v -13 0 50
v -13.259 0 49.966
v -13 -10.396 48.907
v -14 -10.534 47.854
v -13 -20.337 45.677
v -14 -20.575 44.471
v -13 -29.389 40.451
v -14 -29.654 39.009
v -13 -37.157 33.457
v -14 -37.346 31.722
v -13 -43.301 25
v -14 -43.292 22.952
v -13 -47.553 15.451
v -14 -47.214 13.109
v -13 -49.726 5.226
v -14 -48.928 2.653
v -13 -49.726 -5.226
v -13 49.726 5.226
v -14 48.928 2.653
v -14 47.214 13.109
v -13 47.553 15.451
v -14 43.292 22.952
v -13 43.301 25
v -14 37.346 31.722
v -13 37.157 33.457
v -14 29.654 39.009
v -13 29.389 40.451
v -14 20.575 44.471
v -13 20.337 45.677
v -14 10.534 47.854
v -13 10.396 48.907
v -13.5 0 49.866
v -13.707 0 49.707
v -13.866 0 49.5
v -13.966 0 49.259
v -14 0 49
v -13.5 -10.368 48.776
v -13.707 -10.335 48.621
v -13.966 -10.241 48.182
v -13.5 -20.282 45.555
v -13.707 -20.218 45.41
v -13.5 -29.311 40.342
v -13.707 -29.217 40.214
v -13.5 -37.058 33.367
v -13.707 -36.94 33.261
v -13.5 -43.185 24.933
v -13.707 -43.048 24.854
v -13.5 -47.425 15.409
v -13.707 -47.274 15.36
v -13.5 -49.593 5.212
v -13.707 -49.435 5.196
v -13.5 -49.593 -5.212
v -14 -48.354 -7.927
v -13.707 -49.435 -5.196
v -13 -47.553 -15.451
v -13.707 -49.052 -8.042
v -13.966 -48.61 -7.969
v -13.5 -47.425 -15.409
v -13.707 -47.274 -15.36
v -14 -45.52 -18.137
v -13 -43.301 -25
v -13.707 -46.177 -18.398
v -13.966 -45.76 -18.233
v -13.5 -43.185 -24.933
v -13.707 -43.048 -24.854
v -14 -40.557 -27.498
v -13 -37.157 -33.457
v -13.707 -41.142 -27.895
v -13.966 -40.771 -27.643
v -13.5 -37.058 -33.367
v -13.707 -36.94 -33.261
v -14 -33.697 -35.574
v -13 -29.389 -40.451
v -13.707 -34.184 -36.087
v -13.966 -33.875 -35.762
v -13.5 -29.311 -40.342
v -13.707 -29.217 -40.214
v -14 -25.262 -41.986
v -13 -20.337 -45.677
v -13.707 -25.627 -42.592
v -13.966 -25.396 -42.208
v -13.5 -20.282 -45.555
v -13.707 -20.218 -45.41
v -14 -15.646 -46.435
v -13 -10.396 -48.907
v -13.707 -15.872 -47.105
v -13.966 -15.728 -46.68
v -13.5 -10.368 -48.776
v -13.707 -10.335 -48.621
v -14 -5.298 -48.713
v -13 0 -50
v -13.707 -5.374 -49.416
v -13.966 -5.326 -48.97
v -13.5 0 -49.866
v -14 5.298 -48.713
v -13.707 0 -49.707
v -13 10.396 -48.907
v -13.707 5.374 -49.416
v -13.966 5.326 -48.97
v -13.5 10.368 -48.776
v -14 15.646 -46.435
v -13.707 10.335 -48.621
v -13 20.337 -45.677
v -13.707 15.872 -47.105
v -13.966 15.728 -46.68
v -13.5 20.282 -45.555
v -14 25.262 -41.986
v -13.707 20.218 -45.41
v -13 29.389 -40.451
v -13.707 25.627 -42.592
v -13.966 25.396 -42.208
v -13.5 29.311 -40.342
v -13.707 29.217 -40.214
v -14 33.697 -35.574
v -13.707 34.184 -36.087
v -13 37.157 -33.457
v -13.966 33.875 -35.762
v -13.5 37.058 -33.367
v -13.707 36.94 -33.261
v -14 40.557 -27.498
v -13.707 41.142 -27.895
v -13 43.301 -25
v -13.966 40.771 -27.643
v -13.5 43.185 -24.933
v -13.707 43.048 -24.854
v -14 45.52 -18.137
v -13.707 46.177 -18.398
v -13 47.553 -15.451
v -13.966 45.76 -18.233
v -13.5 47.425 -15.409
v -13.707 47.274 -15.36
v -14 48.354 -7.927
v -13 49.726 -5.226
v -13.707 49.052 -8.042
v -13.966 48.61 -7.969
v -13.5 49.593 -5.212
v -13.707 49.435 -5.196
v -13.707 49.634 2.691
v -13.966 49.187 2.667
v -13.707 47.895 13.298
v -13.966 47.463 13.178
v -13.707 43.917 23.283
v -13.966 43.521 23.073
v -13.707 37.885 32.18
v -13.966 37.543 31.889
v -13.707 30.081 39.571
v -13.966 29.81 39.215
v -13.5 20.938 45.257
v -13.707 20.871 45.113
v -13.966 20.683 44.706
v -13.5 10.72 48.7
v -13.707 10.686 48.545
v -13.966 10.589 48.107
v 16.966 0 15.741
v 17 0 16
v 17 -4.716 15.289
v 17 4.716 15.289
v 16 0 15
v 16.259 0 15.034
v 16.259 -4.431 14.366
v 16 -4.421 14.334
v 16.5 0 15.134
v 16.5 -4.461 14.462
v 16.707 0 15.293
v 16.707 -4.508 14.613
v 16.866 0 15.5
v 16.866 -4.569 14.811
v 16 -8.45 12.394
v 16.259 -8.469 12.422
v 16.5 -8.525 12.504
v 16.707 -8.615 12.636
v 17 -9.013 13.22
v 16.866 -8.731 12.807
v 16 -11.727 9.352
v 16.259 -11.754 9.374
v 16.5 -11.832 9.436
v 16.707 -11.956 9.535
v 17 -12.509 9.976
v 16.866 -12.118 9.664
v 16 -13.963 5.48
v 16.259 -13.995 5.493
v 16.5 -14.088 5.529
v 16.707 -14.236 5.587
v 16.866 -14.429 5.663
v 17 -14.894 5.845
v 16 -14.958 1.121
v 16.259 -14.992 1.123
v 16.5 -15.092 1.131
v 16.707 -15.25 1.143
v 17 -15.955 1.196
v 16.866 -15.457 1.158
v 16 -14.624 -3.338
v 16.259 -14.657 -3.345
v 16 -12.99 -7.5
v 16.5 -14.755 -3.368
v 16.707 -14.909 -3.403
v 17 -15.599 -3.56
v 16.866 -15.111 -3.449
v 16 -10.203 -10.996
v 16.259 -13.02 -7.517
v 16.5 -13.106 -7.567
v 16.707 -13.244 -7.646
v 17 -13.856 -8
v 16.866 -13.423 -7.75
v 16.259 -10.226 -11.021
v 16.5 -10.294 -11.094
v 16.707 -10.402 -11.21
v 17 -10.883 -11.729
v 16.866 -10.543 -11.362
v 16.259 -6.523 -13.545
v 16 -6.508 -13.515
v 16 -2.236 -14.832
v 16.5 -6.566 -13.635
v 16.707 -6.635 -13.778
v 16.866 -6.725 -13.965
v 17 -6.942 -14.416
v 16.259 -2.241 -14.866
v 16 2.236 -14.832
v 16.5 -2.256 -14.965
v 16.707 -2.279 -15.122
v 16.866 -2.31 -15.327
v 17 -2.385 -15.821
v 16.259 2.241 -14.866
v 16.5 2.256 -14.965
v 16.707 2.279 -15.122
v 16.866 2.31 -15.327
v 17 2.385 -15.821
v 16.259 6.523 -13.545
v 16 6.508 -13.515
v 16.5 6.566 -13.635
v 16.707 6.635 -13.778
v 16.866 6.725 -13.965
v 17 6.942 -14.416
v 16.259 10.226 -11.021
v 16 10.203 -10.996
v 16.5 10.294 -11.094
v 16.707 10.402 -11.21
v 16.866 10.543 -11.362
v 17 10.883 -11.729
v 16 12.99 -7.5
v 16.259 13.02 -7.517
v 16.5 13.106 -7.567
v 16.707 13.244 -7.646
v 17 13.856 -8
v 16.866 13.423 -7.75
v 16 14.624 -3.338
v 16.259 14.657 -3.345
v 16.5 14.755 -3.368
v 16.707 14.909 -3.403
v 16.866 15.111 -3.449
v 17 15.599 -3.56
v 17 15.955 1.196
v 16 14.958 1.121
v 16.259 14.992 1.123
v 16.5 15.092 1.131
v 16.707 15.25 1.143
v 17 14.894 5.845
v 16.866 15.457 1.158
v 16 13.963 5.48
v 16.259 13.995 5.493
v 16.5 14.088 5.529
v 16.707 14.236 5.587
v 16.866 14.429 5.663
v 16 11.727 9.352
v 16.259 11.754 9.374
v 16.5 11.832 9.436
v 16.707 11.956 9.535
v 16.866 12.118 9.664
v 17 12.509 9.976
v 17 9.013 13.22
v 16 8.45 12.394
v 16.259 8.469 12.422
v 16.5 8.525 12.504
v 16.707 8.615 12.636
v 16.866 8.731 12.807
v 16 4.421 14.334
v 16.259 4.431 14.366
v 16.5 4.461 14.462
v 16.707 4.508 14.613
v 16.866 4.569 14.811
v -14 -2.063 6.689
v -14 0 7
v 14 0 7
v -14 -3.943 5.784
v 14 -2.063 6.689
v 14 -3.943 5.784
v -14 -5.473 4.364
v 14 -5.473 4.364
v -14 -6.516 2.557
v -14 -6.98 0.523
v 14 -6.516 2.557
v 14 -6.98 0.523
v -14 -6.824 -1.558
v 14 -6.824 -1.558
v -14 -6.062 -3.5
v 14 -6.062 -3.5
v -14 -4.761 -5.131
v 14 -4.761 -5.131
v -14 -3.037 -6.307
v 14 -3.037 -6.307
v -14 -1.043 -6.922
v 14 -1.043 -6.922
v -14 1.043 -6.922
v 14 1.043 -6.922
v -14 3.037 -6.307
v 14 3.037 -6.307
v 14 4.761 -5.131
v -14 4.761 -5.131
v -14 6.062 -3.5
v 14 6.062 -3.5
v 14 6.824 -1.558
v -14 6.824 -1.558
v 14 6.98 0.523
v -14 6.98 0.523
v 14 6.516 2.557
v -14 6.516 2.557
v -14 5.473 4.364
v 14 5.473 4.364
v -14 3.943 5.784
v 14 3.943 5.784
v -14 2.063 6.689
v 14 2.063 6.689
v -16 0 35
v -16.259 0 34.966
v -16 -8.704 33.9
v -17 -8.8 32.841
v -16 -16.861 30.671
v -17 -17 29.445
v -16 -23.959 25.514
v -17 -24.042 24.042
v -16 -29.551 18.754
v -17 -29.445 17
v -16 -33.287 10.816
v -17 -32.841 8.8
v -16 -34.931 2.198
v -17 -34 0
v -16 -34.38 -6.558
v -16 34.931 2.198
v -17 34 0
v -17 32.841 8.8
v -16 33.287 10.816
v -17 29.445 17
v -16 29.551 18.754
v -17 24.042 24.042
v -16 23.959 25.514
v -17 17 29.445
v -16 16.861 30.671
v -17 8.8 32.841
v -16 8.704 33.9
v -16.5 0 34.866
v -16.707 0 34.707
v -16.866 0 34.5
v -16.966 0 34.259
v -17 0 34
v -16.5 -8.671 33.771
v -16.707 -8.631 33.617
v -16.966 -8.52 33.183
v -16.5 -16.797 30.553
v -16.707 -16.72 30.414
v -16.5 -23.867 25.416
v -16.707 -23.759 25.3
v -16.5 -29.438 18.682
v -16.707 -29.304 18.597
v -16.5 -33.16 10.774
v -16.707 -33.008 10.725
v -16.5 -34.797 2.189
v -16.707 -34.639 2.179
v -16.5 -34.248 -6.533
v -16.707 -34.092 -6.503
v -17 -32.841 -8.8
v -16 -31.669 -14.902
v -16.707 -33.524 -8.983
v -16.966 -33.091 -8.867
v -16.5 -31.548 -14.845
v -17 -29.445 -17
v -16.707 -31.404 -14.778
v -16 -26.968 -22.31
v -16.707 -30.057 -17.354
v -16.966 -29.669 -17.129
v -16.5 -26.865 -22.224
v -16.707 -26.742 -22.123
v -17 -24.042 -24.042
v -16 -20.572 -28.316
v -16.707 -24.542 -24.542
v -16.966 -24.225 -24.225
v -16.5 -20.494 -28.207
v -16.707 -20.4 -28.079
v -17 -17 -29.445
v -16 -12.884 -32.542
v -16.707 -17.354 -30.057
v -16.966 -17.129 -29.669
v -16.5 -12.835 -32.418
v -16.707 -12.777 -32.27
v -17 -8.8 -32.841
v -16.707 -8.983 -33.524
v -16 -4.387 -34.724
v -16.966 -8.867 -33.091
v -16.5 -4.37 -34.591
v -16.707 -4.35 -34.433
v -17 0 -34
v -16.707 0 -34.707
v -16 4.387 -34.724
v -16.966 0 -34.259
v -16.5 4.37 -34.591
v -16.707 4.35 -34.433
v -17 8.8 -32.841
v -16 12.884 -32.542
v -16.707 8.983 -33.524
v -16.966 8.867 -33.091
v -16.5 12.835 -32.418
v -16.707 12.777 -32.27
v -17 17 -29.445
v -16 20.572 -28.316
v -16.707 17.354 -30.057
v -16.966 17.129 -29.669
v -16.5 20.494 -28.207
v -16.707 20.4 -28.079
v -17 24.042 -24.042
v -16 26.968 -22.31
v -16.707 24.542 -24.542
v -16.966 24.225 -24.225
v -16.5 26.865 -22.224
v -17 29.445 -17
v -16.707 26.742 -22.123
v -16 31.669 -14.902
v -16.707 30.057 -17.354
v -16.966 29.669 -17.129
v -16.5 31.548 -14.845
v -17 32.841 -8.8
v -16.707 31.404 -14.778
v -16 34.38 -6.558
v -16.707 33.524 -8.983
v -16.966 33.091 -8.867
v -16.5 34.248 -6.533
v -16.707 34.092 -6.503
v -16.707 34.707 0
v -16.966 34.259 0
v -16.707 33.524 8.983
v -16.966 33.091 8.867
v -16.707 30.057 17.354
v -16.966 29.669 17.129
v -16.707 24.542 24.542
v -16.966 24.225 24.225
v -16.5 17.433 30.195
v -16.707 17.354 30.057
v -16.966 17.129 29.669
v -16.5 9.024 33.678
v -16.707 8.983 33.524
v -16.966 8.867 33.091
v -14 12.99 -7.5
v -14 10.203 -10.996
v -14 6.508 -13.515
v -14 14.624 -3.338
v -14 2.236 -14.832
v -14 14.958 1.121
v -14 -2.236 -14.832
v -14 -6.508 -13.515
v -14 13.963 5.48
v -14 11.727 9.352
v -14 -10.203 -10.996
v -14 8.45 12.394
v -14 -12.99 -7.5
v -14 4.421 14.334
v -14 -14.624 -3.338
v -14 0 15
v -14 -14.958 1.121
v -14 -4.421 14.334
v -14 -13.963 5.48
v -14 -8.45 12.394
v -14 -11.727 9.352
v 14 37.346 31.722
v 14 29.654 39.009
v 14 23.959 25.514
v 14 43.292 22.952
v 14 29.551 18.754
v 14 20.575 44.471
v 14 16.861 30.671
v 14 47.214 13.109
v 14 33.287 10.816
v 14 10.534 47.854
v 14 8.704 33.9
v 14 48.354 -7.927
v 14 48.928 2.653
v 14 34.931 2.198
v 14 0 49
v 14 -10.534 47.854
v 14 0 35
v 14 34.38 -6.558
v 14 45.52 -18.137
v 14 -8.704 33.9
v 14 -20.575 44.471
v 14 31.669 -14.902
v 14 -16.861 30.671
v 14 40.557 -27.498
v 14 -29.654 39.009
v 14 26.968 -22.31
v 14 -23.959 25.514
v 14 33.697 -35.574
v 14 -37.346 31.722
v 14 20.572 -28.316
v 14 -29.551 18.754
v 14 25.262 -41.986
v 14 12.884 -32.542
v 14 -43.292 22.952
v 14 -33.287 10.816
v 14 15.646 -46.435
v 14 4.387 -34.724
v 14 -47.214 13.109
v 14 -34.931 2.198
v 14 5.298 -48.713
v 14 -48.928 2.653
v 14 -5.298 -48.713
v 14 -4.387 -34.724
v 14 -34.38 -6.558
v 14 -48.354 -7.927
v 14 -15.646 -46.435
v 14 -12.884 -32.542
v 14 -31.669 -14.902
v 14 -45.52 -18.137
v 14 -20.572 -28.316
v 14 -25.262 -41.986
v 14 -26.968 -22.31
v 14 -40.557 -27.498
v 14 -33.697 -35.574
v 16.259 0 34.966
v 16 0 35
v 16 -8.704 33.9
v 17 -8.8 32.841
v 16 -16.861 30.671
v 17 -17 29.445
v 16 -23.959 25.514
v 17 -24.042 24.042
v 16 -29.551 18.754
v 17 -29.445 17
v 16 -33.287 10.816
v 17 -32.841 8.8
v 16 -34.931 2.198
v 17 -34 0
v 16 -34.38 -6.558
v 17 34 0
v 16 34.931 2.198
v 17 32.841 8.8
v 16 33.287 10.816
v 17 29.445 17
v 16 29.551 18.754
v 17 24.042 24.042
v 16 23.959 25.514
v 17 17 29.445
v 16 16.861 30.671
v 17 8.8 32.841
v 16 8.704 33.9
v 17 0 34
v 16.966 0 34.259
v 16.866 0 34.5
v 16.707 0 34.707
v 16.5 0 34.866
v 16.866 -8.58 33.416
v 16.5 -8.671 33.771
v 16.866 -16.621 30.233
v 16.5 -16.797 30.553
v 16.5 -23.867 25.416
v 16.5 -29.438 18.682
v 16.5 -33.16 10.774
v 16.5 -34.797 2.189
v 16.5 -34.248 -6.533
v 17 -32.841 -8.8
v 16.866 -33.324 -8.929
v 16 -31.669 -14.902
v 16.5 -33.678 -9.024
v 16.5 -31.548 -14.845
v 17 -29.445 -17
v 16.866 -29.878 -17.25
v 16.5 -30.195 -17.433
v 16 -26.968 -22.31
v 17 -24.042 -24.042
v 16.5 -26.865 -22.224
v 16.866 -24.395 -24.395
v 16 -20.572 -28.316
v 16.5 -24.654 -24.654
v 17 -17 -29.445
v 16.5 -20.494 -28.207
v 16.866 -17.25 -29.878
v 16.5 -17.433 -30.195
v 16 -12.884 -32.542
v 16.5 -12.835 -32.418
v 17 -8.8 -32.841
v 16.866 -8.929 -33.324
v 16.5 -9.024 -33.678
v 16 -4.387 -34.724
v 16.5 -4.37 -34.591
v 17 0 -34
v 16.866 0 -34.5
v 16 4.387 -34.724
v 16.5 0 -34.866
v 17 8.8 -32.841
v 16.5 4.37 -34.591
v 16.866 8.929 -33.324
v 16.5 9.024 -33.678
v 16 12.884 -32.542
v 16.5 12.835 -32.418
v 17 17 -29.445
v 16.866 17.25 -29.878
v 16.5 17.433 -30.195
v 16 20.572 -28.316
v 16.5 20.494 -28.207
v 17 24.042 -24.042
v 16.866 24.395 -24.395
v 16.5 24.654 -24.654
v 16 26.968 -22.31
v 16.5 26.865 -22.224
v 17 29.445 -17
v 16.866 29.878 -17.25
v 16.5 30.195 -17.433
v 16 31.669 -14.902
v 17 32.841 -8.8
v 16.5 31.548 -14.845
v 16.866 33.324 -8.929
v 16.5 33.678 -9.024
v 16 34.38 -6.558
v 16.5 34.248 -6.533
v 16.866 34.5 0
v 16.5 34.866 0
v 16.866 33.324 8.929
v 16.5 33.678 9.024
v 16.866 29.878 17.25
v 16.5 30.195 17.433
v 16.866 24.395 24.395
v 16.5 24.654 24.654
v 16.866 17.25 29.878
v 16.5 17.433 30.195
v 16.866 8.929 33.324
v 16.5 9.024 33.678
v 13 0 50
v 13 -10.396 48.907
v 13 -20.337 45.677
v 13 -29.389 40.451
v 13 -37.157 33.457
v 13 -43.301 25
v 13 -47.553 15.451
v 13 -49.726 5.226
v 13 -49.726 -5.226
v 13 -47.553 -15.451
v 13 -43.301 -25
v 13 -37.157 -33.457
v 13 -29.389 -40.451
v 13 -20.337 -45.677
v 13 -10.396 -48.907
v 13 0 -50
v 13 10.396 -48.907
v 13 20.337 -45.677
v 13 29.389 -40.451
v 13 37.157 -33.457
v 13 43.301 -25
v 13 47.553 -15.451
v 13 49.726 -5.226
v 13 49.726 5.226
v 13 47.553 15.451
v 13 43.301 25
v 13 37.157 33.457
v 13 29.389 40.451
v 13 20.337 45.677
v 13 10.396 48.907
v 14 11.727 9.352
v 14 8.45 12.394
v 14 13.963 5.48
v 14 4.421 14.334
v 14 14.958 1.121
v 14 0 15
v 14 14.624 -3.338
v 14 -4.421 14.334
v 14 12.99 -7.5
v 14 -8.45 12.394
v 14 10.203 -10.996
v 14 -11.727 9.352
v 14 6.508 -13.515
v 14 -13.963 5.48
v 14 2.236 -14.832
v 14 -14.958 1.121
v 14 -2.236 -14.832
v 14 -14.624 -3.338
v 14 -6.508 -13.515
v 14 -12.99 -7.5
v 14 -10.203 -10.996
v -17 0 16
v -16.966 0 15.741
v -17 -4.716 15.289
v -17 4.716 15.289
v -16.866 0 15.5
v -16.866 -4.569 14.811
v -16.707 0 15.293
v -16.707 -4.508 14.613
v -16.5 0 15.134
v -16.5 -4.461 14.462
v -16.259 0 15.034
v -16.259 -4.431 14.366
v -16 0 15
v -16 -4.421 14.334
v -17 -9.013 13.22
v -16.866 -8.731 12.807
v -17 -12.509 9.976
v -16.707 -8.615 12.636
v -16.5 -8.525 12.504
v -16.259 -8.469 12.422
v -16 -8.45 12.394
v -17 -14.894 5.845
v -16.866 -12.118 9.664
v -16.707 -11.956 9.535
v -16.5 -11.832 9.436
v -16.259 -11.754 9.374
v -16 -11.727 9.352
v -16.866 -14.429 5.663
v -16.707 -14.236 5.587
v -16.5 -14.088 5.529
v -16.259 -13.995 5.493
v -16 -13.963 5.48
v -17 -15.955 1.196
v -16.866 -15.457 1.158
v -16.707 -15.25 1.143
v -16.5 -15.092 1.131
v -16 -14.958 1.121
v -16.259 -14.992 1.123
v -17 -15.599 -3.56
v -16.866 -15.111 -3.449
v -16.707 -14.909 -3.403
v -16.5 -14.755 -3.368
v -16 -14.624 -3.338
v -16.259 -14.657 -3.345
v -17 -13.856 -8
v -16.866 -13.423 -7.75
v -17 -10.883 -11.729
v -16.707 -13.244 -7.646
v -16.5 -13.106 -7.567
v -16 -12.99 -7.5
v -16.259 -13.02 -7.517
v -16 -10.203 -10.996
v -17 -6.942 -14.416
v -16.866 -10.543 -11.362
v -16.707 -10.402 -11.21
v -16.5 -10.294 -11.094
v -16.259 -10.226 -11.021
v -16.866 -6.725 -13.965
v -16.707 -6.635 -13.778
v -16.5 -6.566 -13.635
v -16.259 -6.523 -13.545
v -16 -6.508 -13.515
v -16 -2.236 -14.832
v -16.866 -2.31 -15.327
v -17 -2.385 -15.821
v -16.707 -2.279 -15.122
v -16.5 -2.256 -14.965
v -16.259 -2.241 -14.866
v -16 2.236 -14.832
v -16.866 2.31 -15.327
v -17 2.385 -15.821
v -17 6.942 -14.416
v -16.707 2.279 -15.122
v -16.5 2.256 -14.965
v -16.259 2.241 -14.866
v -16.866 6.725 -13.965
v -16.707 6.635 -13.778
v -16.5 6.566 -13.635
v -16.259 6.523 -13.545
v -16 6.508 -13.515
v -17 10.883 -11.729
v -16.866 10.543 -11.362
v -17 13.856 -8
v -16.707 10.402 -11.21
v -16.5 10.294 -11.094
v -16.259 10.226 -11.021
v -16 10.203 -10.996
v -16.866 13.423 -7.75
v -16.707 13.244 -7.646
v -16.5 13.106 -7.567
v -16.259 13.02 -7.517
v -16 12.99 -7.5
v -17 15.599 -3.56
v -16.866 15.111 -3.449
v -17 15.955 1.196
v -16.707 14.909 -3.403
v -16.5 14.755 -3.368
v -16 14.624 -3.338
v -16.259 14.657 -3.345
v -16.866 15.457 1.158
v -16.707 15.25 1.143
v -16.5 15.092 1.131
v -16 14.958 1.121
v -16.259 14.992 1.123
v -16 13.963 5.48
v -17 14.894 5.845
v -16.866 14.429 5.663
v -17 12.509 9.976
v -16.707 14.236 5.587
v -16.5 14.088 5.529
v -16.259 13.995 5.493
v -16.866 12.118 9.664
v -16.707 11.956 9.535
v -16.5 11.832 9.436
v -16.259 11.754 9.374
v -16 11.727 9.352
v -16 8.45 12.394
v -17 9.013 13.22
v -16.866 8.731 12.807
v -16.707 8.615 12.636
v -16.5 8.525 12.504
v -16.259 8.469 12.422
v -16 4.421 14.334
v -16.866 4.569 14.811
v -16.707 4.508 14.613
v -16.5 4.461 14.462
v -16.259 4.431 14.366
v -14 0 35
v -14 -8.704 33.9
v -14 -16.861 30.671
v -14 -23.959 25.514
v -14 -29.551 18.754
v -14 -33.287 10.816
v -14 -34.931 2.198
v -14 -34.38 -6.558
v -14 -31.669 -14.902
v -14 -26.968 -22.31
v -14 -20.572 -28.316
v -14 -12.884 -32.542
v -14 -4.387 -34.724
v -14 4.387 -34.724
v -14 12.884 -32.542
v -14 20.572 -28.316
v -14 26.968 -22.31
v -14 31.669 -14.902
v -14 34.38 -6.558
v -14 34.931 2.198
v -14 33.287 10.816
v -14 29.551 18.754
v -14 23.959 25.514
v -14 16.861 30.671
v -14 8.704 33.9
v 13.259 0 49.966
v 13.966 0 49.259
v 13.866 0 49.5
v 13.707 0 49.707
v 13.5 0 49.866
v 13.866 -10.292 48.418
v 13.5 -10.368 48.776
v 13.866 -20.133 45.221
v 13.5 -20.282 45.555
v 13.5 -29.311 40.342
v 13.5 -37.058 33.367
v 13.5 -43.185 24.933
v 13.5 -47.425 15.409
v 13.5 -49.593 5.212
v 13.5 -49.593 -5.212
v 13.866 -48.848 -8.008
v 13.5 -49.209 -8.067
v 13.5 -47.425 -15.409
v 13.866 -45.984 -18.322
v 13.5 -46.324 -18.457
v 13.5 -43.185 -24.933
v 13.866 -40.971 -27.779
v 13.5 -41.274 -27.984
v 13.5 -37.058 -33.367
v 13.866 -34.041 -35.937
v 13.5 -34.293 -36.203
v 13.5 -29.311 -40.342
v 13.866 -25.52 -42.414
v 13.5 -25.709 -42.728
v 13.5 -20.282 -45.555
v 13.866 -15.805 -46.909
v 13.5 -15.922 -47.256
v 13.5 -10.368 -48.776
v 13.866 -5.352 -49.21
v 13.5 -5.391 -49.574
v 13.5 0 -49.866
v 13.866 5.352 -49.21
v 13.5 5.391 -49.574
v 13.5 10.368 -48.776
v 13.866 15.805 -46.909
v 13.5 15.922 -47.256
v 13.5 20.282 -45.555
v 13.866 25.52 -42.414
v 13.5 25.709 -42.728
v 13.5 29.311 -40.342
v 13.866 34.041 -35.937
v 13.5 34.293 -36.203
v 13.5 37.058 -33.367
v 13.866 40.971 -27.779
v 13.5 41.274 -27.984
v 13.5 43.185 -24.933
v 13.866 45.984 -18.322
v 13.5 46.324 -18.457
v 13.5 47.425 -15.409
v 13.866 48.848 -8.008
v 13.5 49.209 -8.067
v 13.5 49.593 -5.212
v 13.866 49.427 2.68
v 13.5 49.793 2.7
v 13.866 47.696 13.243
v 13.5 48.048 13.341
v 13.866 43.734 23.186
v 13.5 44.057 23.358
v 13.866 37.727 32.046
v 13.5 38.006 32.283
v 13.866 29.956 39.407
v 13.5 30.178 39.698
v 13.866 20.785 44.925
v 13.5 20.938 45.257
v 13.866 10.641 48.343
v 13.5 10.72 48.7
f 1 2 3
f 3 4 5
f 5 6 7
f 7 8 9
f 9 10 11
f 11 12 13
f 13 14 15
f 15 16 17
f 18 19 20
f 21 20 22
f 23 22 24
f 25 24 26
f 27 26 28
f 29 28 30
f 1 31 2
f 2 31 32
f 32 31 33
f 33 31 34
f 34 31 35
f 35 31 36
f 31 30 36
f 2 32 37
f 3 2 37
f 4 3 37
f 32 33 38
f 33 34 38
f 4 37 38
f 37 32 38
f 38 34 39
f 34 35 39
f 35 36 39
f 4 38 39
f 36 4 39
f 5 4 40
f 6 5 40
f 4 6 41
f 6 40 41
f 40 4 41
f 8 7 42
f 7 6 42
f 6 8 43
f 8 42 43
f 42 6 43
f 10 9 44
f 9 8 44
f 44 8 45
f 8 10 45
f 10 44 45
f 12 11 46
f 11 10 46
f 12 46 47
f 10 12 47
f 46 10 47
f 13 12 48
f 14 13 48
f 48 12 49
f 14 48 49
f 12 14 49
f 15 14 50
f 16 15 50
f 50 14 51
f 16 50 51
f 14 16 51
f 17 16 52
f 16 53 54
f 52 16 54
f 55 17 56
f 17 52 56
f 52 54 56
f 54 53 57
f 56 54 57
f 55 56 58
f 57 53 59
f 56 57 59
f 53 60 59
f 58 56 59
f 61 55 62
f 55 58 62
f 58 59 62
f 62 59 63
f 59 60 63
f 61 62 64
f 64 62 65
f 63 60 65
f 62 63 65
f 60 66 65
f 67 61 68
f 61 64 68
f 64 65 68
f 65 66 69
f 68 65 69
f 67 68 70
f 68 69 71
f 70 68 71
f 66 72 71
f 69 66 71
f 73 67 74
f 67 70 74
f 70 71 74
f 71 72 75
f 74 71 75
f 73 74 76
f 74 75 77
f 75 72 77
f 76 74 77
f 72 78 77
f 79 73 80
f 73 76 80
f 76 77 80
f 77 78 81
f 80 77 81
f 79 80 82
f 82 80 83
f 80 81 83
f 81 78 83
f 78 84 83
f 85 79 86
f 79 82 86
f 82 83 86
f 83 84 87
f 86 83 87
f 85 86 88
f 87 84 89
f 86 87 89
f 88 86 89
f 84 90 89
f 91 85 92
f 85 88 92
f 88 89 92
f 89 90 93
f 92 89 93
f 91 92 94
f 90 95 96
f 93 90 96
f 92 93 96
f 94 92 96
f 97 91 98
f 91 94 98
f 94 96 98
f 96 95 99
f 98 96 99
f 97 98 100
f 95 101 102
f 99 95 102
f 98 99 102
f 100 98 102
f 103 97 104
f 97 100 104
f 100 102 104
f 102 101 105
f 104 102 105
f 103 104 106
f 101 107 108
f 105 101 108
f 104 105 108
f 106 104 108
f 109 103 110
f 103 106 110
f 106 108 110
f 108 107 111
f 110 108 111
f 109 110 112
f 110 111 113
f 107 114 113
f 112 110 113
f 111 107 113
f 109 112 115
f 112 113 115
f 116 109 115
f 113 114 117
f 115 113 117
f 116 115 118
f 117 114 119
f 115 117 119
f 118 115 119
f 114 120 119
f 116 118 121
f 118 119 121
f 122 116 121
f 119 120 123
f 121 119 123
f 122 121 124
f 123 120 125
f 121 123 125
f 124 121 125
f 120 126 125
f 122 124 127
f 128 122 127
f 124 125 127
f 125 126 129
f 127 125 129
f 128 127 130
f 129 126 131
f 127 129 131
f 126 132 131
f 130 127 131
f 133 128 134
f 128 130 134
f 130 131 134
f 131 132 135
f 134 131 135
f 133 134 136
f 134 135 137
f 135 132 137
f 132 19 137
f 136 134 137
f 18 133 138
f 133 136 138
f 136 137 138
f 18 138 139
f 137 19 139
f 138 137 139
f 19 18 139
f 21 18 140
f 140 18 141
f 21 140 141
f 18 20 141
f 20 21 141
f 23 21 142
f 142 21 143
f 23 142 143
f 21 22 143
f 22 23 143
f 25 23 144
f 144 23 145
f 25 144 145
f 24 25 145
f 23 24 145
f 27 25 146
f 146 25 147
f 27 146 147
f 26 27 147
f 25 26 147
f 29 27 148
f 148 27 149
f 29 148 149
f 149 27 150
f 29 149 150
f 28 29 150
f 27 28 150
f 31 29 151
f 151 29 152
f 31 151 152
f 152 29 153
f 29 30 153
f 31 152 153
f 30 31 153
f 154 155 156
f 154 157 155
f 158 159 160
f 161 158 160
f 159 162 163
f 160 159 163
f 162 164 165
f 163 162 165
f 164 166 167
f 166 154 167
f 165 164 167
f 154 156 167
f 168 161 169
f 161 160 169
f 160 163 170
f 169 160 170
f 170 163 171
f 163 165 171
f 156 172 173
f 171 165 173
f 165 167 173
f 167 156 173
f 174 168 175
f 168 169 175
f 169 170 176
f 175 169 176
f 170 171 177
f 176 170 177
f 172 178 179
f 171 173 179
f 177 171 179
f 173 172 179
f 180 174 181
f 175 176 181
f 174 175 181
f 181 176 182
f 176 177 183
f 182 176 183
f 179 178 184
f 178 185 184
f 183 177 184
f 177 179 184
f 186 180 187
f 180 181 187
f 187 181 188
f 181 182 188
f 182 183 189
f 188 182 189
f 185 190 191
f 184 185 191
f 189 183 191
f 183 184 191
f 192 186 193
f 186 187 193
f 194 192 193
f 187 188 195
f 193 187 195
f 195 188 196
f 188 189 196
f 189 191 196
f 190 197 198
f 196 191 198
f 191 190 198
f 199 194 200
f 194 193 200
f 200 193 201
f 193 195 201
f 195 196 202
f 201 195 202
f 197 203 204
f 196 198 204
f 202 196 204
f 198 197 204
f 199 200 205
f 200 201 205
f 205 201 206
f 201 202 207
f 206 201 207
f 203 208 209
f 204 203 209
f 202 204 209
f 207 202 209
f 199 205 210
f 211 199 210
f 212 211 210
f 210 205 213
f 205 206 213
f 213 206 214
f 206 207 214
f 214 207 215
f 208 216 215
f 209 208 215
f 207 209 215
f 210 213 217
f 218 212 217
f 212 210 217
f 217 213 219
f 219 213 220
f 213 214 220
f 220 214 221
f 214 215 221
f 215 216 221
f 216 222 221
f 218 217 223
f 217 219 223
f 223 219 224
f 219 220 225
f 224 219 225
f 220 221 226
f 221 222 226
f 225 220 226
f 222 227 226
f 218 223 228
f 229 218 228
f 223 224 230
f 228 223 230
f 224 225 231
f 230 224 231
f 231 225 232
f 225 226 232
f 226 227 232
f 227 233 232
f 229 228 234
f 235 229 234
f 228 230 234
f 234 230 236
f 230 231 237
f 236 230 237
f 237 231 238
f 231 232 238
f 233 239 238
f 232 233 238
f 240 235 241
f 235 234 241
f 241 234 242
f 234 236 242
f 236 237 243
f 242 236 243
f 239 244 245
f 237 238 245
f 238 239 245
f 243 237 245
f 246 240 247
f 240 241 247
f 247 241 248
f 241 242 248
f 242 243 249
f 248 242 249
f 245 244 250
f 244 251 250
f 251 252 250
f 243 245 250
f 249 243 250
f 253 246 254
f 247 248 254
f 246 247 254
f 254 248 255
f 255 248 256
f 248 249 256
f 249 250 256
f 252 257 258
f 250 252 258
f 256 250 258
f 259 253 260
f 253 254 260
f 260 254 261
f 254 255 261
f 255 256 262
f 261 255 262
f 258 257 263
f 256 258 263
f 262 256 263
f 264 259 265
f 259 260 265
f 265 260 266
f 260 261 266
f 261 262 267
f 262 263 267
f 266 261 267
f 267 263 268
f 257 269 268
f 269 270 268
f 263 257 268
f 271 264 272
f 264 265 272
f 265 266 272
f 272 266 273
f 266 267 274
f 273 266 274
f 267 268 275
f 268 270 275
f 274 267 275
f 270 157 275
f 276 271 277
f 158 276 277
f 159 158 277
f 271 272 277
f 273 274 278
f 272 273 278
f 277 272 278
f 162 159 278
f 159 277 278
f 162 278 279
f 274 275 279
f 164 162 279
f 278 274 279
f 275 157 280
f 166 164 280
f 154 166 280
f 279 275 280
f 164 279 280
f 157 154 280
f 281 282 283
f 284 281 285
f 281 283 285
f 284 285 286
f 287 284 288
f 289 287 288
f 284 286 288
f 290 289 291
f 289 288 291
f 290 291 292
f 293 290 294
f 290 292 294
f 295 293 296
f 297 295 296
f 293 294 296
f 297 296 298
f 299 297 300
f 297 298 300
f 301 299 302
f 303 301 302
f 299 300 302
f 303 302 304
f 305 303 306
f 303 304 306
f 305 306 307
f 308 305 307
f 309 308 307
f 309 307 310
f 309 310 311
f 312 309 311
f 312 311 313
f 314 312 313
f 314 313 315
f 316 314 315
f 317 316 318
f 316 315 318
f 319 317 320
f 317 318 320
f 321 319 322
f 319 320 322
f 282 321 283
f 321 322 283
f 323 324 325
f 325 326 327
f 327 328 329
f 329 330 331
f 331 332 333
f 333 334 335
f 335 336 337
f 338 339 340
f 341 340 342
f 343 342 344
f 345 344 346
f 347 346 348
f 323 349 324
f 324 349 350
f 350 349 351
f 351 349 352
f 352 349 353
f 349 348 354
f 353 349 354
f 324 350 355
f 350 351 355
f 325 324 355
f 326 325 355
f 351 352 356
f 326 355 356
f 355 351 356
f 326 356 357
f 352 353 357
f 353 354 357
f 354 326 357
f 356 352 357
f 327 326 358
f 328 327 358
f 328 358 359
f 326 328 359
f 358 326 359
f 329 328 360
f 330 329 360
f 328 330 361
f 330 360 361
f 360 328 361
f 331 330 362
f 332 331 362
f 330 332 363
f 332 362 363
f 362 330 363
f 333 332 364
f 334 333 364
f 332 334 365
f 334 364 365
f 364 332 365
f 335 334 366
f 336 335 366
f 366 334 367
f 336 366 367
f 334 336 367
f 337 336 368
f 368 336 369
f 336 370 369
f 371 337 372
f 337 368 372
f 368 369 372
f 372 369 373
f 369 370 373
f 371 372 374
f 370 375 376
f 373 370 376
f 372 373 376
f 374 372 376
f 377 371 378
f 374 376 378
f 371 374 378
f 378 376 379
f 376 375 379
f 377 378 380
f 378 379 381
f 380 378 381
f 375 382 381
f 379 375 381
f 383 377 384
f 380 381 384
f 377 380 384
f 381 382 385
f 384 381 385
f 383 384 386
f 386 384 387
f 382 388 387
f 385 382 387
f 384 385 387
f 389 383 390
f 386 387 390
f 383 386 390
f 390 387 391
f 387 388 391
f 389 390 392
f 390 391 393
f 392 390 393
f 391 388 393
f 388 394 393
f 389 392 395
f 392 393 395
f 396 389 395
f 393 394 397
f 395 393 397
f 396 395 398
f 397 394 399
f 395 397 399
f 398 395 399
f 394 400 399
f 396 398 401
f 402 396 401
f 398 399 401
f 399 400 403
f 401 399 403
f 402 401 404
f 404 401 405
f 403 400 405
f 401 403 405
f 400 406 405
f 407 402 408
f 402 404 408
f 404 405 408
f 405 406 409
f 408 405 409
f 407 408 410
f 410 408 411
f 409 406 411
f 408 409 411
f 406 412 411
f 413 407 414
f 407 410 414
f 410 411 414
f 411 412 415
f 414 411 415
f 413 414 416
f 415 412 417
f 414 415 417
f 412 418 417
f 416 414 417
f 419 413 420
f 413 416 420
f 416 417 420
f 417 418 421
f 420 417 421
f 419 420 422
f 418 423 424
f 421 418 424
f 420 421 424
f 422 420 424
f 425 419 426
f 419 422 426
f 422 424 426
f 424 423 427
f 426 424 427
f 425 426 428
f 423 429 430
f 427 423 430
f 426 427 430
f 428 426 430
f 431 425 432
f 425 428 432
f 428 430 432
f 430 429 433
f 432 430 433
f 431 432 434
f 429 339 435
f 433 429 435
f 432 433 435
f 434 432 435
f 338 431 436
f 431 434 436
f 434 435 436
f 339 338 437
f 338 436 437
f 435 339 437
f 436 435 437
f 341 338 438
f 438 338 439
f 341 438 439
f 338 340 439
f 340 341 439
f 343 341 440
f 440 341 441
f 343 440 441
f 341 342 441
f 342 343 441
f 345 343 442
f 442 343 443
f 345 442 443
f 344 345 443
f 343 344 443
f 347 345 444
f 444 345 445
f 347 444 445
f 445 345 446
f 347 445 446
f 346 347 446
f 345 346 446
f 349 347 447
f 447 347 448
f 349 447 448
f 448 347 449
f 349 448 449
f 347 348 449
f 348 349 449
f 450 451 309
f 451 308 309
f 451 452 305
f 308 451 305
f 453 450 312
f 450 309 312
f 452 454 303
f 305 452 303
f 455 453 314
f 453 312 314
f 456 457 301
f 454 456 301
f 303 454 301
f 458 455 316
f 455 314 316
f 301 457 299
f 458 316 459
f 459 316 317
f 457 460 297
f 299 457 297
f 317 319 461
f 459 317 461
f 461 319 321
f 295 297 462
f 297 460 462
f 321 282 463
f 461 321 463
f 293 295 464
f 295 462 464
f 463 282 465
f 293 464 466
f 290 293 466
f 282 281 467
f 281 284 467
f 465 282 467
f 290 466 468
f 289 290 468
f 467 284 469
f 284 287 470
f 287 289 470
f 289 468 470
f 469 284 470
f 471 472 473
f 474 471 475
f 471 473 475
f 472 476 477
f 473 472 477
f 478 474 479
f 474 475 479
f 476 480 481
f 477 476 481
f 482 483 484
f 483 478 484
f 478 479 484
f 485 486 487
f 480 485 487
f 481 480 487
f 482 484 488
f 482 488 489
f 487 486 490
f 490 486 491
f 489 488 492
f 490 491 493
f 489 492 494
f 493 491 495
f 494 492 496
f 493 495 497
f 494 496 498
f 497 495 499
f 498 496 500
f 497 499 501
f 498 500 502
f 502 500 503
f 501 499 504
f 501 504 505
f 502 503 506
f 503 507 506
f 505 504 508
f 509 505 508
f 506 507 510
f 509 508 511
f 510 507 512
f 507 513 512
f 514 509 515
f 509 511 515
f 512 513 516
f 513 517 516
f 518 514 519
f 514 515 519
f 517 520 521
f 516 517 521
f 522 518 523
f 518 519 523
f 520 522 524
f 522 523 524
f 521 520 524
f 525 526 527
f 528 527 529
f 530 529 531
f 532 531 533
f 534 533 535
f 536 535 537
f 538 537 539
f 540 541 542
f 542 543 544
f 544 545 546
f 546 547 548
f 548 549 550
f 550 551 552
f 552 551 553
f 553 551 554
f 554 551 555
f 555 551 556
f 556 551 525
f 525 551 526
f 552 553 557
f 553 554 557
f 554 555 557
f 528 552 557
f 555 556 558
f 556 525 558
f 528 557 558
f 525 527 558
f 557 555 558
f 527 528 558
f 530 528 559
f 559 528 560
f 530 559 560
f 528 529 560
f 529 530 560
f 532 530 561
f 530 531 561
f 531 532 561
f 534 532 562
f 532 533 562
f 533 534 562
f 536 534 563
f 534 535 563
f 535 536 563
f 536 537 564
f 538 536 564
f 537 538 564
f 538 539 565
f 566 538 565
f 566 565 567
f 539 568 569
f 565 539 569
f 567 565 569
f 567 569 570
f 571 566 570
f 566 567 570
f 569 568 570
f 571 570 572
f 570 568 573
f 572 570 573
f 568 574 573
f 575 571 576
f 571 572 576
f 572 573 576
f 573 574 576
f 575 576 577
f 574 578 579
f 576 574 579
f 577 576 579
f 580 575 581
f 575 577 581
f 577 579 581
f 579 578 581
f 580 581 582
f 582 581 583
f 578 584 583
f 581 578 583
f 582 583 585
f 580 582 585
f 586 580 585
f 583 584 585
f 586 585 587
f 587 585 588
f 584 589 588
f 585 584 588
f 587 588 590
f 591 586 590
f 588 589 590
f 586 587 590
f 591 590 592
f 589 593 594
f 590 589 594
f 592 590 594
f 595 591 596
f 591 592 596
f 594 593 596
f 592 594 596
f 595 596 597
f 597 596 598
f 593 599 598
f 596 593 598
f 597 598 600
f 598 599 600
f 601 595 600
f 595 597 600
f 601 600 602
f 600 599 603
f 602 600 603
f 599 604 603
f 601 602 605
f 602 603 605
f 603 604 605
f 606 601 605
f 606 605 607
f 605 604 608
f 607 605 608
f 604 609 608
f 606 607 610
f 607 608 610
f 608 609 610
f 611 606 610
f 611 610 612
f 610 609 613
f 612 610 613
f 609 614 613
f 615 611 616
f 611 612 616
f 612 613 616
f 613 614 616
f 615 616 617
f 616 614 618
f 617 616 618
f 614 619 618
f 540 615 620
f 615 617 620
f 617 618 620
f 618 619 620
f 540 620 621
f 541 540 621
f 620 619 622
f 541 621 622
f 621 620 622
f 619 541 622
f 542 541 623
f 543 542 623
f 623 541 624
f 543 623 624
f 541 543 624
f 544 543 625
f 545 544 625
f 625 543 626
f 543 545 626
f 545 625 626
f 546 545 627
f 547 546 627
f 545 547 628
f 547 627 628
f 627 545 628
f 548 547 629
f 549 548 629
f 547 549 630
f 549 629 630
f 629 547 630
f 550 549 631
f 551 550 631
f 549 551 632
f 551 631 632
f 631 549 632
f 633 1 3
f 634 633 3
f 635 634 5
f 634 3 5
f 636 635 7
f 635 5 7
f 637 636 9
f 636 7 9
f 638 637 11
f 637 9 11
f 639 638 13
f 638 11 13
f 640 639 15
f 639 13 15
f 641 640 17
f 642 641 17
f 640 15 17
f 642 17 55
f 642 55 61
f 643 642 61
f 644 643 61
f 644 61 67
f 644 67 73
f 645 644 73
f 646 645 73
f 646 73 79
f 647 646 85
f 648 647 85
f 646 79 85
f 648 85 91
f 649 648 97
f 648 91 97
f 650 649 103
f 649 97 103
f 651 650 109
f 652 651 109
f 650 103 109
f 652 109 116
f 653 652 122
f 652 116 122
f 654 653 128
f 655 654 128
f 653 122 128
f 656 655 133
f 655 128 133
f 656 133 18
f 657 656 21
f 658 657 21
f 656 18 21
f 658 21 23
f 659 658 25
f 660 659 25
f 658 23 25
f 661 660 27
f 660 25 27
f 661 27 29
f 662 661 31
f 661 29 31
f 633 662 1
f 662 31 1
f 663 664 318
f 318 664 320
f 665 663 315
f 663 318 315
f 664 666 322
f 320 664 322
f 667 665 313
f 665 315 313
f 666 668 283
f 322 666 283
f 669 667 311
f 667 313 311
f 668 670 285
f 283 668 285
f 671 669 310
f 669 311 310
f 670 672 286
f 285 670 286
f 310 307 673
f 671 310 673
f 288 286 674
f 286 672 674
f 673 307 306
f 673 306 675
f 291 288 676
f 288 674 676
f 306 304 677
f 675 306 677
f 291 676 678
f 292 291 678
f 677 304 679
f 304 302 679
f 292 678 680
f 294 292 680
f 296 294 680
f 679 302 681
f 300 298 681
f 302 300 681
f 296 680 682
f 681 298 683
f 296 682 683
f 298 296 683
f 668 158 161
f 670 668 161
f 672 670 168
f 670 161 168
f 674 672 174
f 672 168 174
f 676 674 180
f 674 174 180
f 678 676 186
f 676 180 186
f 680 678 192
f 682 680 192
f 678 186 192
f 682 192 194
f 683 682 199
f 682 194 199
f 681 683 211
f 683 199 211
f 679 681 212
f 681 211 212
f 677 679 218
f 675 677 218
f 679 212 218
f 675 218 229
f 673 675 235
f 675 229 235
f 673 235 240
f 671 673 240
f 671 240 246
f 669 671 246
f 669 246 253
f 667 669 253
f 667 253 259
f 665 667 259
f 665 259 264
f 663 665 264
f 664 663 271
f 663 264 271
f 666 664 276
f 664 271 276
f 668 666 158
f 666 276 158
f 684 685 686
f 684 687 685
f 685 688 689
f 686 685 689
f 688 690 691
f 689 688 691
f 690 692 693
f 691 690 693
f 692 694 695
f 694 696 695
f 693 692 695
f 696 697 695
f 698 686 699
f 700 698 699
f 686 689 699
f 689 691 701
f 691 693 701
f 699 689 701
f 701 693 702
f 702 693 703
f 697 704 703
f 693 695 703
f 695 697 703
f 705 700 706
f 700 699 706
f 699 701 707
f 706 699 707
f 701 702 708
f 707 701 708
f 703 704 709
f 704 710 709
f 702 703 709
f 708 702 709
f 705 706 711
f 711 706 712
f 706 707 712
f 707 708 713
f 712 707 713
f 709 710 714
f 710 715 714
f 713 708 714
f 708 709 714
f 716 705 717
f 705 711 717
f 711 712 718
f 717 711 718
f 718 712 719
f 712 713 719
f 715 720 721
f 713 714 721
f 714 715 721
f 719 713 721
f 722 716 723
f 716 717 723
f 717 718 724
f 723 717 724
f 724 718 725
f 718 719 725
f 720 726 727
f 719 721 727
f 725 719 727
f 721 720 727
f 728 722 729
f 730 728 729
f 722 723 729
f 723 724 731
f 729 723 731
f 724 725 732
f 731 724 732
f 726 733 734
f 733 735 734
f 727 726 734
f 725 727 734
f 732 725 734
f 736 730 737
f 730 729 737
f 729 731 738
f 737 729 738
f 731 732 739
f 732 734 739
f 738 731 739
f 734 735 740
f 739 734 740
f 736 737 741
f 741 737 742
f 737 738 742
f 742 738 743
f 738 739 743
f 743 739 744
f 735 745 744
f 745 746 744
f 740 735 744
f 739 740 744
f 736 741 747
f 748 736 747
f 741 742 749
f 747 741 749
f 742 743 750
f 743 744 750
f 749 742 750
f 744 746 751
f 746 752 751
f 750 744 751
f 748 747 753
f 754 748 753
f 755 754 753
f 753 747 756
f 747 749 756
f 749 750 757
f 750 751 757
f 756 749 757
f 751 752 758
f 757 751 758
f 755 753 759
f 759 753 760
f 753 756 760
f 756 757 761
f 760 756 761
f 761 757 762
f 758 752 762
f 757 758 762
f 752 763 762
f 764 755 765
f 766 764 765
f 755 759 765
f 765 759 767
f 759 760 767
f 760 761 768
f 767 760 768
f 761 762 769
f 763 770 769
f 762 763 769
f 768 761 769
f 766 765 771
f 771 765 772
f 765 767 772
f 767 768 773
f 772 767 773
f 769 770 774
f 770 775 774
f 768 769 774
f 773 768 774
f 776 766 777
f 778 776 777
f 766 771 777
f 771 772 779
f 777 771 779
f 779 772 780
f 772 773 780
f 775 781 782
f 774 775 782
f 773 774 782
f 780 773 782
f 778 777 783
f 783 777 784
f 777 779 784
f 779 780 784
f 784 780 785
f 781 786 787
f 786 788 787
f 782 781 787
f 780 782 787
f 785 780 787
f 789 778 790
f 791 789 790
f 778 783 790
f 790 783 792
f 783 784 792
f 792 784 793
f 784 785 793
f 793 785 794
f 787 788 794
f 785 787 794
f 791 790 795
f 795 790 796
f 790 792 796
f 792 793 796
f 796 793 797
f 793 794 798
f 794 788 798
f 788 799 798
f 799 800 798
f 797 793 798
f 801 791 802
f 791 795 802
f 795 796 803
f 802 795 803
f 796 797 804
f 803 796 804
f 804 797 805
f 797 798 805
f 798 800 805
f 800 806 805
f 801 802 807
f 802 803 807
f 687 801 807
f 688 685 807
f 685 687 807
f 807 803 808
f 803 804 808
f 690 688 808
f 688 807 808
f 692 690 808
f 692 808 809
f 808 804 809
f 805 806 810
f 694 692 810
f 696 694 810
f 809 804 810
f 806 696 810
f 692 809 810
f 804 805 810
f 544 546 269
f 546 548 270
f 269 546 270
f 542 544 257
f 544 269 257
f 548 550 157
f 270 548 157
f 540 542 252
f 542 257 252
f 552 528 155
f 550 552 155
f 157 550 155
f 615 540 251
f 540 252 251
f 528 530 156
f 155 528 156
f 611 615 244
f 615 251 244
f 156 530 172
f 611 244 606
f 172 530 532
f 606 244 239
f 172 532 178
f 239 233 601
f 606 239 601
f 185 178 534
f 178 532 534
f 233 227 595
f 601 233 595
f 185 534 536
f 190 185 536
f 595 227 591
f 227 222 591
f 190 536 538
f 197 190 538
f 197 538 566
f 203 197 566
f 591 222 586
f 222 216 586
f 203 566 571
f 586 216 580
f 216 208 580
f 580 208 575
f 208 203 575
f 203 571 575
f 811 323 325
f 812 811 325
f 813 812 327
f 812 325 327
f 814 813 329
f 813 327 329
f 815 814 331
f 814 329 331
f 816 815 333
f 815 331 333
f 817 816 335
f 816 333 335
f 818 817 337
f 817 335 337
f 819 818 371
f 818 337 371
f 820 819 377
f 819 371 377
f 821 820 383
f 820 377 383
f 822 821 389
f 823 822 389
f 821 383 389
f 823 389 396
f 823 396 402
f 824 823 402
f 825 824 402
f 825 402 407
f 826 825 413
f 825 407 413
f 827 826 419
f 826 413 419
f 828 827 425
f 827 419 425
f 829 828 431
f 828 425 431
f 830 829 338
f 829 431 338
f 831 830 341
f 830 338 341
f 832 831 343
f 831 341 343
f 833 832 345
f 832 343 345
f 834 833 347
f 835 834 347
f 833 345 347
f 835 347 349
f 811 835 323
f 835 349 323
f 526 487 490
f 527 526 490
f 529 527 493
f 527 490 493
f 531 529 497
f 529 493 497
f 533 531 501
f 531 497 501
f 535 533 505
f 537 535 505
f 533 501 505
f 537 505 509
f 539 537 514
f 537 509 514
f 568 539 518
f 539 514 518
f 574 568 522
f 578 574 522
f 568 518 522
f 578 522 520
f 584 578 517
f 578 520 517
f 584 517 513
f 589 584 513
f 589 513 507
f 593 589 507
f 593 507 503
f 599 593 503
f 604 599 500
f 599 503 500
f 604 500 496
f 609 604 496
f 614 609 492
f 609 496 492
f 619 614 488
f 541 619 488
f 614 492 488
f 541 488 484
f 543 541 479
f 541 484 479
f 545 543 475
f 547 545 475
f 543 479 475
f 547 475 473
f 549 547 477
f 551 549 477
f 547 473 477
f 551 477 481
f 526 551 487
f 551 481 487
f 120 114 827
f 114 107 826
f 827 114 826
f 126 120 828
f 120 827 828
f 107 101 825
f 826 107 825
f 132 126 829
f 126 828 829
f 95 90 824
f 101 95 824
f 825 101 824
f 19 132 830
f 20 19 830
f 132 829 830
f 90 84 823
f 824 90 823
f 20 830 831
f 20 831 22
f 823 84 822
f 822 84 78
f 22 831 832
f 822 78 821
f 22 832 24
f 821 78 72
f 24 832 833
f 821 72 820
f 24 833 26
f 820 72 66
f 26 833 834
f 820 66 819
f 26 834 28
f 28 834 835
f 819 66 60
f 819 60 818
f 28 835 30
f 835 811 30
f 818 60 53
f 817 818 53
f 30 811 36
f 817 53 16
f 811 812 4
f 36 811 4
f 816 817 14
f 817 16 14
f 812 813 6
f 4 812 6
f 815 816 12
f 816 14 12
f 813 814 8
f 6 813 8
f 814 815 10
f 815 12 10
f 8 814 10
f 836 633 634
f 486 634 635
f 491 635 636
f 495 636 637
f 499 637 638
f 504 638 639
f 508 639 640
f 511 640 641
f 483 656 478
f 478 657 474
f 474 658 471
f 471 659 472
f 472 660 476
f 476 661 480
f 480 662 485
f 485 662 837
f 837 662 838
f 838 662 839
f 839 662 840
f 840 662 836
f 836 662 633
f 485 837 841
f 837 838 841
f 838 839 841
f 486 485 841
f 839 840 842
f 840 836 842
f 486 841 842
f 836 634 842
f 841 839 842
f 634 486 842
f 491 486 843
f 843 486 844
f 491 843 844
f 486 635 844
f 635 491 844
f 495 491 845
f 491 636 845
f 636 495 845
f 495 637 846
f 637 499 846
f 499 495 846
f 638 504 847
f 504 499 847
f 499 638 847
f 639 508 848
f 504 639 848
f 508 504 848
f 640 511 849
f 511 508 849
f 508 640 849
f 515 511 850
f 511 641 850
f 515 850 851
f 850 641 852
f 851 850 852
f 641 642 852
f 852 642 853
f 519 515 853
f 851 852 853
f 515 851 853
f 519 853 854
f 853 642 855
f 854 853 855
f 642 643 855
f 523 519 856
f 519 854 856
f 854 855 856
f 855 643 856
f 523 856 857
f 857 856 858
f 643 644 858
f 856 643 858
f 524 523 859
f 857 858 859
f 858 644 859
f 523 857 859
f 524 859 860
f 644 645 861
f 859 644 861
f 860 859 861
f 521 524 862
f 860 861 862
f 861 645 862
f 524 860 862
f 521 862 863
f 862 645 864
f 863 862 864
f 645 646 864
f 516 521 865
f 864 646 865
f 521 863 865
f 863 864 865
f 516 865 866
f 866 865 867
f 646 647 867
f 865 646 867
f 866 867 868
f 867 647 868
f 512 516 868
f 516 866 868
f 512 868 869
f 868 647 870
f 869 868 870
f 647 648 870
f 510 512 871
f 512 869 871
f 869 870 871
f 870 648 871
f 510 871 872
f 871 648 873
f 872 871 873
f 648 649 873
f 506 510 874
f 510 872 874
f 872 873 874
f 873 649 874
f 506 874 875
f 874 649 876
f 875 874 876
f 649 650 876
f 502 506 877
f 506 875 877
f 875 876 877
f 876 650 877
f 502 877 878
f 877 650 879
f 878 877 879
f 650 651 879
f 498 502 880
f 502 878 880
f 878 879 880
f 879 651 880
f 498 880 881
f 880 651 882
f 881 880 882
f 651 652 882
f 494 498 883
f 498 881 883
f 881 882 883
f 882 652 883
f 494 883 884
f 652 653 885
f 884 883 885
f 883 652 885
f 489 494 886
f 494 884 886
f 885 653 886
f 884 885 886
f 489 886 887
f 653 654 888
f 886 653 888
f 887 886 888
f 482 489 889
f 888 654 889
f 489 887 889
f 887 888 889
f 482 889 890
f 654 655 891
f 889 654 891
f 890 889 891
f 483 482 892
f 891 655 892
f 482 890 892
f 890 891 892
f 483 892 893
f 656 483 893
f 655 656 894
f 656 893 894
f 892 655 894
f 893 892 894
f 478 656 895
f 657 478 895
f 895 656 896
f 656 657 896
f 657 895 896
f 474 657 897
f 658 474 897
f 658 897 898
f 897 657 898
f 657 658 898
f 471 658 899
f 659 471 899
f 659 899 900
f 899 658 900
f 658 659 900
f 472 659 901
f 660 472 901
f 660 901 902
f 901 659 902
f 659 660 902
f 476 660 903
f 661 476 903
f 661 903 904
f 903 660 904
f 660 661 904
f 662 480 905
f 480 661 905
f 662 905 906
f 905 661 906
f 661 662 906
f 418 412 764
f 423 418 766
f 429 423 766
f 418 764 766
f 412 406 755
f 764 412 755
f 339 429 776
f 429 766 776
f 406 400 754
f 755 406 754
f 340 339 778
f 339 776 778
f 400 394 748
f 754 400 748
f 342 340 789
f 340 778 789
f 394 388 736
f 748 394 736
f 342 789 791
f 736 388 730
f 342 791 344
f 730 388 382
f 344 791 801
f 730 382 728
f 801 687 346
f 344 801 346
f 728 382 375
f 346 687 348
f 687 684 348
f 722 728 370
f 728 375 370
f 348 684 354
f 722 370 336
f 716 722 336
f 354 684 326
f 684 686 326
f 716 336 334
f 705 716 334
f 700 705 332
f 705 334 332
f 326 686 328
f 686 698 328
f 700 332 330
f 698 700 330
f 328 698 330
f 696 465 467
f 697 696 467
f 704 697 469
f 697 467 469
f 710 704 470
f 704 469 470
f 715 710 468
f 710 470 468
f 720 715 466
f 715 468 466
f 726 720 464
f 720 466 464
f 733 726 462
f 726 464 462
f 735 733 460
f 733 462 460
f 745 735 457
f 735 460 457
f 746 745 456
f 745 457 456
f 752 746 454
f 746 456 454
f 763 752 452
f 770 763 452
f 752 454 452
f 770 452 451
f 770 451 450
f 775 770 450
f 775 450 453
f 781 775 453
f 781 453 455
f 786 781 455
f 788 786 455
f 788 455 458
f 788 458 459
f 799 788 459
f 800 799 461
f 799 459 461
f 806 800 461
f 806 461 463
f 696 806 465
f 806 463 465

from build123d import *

# Parameters (mm, degrees)
FILLET1_R = 1


with BuildPart() as part:
    # Sketch1 → Revolve1 (revolve)
    with BuildSketch(Plane.XY, mode=Mode.PRIVATE) as revolve1_sk:
        Polygon((14, 7), (14, 15), (17, 15), (17, 35), (14, 35), (14, 50), (-14, 50), (-14, 35), (-17, 35), (-17, 15), (-14, 15), (-14, 7), align=None)
    revolve(revolve1_sk.sketch.rotate(Axis((0, 0, 0), (1, 0, 0)), 90), axis=Axis((0, 0, 0), (1, 0, 0)))

    # Fillet1
    fillet1_edges = [part.edges().sort_by_distance(p)[0] for p in [
        (-17, 0, -15),
        (-17, 0, -35),
        (-14, 0, -50),
        (14, 0, -50),
        (17, 0, -35),
        (17, 0, -15),
    ]]
    fillet(fillet1_edges, radius=FILLET1_R)


solid = part.part
